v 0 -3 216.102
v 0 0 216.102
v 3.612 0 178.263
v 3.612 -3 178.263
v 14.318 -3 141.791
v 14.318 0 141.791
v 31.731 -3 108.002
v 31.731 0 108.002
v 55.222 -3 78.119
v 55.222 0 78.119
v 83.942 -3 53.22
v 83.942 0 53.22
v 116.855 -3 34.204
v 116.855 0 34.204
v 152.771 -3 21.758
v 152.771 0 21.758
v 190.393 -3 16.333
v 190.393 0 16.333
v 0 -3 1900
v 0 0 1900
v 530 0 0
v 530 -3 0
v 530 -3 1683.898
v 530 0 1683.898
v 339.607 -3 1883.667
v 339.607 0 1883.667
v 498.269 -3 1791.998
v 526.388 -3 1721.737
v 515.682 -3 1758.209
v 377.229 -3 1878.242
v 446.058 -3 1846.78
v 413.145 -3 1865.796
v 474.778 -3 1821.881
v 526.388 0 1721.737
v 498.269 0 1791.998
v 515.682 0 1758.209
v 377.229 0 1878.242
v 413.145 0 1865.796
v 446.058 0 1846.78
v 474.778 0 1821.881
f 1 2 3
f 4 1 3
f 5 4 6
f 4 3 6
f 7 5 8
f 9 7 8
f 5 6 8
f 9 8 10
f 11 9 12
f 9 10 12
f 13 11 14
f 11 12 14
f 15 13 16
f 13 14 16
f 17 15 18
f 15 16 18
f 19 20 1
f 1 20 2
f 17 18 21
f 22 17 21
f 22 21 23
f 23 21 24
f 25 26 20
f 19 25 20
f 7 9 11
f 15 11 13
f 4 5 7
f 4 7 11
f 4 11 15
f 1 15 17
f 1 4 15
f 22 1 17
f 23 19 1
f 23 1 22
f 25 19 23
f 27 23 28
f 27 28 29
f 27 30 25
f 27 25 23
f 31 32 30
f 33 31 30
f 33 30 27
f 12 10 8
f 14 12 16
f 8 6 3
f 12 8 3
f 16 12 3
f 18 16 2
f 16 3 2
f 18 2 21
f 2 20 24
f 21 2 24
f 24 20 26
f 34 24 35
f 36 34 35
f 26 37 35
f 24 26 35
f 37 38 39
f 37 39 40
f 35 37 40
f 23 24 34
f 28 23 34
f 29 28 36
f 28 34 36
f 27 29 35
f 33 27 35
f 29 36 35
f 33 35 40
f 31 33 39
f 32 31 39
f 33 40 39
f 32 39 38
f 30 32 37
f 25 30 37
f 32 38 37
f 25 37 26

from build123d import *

# Parameters (mm, degrees)
F1_DEPTH = 3


with BuildPart() as f1:
    # F0 (on Front) → F1 (new body)
    with BuildSketch(Plane.XZ):
        with BuildLine():
            Line((190.392517, 16.33272), (530, 0))
            Line((530, 0), (530, 1683.898172))
            ThreePointArc((530, 1683.898172), (474.778273, 1821.880967), (339.607483, 1883.66728))
            Line((339.607483, 1883.66728), (0, 1900))
            Line((0, 1900), (0, 216.101828))
            ThreePointArc((0, 216.101828), (55.221727, 78.119033), (190.392517, 16.33272))
        make_face()
    extrude(amount=F1_DEPTH)


solid = f1.part
